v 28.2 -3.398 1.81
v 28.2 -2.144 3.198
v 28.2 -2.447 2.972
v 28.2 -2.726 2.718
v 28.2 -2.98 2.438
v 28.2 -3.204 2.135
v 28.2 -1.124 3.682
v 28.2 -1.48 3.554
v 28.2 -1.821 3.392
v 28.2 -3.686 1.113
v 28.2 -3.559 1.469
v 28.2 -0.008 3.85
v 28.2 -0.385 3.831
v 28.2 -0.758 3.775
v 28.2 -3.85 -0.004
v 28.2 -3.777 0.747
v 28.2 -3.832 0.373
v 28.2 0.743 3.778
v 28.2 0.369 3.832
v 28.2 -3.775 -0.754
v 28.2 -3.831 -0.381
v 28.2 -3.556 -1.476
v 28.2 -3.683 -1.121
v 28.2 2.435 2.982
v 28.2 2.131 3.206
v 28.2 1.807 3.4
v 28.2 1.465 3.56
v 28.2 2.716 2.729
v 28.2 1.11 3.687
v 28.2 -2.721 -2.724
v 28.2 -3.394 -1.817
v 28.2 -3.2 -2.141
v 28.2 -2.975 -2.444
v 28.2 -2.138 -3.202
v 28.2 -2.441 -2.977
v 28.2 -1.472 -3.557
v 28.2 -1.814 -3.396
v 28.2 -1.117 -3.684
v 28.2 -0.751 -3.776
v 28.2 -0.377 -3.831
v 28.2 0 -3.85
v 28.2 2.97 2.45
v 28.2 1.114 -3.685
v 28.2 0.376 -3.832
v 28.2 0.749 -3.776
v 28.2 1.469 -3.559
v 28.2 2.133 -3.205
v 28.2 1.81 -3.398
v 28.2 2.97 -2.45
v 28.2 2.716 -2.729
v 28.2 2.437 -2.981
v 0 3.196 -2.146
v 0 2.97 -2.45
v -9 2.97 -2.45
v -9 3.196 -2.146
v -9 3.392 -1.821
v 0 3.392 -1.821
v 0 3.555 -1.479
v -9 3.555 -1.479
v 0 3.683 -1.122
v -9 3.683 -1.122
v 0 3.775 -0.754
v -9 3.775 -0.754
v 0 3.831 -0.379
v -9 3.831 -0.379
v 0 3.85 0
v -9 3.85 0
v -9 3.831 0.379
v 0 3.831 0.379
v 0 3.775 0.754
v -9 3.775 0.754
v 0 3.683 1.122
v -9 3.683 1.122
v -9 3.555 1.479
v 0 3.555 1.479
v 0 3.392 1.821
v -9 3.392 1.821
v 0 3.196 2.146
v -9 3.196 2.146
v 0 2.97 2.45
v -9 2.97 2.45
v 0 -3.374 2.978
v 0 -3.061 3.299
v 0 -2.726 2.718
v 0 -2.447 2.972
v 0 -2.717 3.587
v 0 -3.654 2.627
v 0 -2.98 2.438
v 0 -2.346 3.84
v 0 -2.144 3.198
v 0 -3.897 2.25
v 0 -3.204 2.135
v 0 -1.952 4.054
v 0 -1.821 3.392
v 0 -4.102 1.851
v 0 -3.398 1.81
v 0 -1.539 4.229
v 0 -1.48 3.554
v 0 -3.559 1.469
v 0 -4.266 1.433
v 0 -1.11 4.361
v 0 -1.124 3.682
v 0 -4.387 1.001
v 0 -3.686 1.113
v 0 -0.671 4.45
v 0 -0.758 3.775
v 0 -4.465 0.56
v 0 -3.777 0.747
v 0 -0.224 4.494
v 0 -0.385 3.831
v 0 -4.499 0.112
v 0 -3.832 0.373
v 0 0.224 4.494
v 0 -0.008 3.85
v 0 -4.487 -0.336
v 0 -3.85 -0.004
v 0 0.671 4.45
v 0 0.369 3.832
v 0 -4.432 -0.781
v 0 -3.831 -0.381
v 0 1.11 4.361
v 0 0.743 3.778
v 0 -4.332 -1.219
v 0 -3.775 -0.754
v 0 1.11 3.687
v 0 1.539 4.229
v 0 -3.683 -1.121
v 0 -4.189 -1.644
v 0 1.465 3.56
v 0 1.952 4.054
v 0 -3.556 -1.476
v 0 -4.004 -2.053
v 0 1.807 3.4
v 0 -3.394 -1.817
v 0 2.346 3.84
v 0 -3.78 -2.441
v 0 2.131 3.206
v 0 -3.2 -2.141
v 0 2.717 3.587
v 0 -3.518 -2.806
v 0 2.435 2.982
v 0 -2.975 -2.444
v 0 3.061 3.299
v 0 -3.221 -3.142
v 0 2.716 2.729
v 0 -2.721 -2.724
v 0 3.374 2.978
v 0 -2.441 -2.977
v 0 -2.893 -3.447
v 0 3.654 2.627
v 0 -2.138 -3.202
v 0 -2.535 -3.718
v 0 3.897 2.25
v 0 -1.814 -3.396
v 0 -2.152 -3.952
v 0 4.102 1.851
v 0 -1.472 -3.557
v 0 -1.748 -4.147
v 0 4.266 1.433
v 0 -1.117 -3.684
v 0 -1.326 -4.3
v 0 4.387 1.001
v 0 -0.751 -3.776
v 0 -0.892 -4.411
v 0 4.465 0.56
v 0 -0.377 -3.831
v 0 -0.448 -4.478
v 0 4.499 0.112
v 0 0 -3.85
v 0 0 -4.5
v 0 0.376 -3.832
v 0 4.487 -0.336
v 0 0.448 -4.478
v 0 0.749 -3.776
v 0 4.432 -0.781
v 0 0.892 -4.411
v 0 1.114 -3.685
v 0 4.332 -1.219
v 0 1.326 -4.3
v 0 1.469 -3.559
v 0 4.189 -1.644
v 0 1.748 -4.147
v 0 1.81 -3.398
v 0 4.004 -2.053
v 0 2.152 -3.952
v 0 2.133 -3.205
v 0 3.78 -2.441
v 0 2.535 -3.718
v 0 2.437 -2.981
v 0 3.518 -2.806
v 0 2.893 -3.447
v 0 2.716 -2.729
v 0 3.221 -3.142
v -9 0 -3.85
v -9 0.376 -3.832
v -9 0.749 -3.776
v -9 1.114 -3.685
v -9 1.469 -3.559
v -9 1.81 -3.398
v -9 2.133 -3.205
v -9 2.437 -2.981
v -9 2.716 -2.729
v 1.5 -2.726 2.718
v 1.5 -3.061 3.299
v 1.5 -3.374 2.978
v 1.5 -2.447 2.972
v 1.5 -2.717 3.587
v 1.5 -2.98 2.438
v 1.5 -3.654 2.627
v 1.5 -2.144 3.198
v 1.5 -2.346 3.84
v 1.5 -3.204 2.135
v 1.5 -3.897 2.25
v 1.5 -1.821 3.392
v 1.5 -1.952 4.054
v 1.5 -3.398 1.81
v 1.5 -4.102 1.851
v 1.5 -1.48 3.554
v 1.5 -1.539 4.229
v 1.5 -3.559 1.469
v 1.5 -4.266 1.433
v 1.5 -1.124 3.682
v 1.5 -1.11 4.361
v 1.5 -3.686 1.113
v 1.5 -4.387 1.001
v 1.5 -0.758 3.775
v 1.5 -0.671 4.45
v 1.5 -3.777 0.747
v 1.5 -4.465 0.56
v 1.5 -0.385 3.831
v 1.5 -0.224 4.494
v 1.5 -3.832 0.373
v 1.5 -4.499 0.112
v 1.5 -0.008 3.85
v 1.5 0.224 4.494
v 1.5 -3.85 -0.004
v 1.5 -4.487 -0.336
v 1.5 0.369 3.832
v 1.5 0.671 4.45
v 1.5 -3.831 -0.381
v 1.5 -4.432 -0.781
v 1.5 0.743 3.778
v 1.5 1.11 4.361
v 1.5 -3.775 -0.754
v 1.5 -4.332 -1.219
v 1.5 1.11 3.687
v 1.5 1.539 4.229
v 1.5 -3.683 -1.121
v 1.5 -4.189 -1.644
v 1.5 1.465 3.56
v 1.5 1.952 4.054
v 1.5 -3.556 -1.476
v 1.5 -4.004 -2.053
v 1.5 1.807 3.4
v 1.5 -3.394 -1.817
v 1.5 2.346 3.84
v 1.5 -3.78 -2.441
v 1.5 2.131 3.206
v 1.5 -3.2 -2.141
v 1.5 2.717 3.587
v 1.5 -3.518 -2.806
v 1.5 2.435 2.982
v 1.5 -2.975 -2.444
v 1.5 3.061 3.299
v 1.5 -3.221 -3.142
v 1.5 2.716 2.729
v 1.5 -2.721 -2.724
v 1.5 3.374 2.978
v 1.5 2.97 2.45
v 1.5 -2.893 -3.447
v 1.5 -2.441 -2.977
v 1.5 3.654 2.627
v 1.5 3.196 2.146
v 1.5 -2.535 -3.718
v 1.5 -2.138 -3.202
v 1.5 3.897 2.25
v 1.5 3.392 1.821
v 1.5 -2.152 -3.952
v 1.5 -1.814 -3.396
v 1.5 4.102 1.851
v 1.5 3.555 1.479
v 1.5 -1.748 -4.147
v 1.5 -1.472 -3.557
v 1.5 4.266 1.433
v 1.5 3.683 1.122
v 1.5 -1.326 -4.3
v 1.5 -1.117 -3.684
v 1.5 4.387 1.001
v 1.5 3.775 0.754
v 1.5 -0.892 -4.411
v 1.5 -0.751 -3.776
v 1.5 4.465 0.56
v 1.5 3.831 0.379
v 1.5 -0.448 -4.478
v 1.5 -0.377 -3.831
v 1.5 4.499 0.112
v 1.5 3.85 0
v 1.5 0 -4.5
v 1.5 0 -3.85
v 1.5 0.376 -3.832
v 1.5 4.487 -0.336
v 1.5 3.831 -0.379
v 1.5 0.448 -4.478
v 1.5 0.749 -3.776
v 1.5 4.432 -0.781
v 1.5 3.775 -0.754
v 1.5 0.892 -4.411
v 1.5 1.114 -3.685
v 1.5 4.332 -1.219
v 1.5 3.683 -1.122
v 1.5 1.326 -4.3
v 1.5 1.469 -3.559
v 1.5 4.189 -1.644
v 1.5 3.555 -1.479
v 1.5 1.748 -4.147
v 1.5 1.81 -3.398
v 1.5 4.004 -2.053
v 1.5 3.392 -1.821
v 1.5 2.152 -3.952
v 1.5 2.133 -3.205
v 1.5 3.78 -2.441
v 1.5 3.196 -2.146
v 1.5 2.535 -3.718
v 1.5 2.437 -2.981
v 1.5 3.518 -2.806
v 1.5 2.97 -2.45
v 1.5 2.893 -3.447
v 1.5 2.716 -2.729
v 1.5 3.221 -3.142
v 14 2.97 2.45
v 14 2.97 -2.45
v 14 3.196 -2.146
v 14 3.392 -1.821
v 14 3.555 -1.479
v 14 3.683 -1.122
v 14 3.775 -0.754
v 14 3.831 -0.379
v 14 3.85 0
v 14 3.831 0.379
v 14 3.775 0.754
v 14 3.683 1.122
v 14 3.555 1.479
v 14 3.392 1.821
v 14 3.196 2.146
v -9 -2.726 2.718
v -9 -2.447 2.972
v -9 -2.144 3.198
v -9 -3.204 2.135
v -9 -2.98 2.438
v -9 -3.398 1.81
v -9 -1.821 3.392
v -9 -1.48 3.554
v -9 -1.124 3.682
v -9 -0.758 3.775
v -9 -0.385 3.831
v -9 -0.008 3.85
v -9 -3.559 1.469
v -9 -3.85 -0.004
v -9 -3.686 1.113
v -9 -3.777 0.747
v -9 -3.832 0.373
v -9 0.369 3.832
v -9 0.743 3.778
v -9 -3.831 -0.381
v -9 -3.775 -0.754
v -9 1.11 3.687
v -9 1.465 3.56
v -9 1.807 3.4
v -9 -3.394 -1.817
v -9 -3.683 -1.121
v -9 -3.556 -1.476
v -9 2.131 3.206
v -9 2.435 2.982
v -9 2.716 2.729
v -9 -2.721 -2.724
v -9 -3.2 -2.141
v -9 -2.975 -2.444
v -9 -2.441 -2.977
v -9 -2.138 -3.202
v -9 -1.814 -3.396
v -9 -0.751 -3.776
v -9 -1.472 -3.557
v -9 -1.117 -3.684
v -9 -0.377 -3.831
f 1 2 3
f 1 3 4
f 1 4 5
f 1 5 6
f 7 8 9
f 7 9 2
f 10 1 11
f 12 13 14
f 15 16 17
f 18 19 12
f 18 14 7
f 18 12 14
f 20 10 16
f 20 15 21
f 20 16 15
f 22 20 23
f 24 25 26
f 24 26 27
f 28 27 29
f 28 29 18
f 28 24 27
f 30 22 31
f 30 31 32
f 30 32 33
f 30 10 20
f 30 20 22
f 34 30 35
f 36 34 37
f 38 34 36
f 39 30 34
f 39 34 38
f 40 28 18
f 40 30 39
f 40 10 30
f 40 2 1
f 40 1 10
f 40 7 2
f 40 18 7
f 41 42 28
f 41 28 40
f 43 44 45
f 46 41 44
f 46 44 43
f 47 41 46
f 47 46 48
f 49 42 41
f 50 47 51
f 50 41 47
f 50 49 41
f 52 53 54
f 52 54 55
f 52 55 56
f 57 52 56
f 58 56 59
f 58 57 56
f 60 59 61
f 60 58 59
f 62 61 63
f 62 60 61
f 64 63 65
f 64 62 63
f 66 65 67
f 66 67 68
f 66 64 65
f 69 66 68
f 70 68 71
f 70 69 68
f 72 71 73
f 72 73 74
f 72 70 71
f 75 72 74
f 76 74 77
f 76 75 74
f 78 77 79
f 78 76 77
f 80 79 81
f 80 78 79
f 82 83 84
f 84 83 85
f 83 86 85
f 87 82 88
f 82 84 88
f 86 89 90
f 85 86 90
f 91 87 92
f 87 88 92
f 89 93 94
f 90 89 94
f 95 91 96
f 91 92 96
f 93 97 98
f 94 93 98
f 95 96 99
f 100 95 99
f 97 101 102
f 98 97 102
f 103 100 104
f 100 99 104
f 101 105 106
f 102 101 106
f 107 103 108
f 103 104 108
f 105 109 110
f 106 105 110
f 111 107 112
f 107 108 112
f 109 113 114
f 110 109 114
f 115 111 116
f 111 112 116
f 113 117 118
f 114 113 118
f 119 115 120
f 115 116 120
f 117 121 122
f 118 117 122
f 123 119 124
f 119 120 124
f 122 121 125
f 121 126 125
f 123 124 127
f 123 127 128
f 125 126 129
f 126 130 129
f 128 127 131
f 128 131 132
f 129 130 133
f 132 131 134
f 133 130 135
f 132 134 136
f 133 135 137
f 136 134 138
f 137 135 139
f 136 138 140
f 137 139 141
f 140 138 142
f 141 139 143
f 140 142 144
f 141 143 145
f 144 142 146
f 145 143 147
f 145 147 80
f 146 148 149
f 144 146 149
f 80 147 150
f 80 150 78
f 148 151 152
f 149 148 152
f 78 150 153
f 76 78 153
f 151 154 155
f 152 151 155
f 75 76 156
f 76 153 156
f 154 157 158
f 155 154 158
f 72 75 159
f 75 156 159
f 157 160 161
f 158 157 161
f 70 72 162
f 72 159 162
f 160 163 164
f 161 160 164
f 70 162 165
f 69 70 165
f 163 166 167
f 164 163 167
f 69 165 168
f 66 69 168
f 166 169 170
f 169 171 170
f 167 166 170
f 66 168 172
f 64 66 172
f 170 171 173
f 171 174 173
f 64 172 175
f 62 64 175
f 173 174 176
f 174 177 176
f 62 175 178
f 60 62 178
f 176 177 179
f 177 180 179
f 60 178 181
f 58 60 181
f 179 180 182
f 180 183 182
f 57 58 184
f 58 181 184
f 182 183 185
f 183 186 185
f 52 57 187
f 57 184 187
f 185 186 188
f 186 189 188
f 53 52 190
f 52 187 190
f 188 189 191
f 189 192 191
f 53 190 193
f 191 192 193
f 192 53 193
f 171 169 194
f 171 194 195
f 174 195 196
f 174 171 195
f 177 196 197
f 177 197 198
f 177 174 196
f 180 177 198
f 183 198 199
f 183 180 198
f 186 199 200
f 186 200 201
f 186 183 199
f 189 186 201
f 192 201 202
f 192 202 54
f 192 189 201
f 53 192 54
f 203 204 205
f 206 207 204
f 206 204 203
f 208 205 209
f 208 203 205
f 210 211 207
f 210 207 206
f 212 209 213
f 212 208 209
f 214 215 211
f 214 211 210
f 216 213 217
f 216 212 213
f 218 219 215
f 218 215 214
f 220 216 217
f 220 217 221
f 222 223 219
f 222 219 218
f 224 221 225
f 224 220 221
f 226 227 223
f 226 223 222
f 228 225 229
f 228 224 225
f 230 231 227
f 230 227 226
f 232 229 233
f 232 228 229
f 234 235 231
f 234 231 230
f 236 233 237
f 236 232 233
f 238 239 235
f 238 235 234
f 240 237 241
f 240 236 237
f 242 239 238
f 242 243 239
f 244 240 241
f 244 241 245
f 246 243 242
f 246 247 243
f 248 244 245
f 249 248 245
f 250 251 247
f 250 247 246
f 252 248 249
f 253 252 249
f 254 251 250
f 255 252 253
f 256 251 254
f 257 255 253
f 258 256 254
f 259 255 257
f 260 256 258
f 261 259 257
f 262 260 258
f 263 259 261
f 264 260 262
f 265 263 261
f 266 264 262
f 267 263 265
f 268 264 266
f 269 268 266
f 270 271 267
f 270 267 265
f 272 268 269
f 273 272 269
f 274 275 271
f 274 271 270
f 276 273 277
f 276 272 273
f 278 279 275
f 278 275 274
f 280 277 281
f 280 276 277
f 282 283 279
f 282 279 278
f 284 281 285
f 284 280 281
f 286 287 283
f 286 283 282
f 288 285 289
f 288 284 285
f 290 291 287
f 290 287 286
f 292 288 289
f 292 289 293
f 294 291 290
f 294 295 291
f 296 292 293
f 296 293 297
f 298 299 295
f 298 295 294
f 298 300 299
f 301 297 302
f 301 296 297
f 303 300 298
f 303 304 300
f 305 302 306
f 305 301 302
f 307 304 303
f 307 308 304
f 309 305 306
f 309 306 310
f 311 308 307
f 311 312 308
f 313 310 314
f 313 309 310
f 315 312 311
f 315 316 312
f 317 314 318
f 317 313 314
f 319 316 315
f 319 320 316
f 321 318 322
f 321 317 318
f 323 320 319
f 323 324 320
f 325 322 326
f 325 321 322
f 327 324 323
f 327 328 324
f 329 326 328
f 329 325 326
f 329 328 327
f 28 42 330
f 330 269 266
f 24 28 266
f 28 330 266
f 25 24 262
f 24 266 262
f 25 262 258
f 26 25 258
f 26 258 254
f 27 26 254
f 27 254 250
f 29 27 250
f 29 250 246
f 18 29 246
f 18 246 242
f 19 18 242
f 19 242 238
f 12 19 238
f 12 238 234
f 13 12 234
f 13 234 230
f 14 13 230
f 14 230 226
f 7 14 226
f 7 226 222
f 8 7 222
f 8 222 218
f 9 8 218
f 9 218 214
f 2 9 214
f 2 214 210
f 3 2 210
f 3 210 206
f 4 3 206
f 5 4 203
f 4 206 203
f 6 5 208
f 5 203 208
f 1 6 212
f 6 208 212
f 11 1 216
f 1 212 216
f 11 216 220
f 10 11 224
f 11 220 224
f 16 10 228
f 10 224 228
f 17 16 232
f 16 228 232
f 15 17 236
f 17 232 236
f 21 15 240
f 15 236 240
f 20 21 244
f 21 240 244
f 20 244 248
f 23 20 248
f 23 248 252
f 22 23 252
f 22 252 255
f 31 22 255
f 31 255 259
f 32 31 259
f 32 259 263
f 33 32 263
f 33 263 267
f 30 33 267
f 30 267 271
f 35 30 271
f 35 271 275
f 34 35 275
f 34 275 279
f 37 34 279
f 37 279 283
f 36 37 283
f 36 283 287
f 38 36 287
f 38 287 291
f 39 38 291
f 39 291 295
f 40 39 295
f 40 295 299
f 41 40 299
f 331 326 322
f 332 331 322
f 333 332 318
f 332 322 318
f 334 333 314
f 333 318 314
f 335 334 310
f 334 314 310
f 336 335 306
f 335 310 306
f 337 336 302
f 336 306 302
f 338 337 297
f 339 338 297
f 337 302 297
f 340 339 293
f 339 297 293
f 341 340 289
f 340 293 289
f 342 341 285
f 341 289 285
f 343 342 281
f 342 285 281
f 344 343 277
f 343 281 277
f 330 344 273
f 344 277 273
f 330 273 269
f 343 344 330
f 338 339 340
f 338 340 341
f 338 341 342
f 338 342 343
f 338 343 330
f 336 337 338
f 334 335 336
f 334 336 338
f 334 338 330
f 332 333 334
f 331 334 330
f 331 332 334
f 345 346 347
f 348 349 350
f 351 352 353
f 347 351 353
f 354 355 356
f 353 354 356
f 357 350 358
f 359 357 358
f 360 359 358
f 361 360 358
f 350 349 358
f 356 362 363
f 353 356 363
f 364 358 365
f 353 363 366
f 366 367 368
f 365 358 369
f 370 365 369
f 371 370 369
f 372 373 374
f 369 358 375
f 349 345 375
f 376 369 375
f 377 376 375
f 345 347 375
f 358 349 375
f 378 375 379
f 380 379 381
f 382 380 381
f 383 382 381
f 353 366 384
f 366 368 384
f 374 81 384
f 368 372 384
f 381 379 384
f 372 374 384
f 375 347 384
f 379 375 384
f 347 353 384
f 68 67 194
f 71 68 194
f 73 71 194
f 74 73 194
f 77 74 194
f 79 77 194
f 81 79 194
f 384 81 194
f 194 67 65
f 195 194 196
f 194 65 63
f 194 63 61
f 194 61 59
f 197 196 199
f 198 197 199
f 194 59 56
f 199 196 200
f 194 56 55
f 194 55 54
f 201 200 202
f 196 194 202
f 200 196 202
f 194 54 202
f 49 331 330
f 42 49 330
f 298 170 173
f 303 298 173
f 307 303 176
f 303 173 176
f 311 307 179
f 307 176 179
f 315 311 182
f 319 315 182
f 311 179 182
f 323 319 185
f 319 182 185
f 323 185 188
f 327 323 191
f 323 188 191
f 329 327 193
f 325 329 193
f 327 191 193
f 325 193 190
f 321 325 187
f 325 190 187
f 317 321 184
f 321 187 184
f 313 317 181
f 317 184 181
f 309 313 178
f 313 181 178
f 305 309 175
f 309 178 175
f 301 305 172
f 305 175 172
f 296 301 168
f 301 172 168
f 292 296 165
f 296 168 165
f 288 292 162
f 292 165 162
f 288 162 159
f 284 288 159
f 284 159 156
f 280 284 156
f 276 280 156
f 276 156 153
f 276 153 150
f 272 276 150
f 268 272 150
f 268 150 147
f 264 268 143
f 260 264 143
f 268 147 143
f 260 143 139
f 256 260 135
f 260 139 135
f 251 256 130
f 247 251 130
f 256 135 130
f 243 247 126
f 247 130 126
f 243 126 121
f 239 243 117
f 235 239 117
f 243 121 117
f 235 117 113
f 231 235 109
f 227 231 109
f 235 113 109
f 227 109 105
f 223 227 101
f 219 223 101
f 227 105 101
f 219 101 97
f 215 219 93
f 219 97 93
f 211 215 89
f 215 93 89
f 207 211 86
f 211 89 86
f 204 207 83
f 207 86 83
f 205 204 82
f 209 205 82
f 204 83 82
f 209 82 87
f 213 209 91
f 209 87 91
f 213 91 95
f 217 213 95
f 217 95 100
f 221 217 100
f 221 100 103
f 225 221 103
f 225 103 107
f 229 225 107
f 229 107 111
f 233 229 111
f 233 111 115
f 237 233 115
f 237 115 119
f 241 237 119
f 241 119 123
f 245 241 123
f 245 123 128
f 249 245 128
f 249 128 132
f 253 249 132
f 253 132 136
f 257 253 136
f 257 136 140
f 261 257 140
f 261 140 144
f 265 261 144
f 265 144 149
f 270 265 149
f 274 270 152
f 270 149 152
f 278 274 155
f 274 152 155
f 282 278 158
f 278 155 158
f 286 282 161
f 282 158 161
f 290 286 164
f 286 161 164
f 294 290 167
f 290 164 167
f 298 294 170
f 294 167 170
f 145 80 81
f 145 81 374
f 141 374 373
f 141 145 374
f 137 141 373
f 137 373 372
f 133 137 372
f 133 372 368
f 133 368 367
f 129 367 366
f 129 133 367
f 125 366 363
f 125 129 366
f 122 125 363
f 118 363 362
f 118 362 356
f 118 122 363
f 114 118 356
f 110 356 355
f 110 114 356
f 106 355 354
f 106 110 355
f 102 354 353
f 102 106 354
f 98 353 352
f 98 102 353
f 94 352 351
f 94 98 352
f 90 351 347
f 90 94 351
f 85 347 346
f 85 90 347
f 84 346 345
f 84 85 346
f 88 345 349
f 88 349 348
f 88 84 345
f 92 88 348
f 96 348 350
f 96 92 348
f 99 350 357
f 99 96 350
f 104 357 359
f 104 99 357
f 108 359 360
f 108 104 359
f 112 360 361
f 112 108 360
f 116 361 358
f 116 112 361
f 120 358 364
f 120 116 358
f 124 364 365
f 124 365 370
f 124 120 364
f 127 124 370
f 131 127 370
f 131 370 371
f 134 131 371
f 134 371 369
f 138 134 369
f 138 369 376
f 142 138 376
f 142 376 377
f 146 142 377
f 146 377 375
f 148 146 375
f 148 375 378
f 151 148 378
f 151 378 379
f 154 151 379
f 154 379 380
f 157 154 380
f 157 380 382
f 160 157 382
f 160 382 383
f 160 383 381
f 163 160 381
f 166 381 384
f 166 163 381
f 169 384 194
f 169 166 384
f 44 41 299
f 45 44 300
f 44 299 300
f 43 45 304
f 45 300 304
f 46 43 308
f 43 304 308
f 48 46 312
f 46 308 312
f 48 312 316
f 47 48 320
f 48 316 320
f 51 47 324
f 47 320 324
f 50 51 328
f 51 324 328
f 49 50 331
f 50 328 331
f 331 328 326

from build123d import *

# Parameters (mm, degrees)
BOSS_EXTRUDE1_DEPTH = 28.2
SKETCH9_6_R         = 4.5
SKETCH9_6_R_2       = 3.85
BOSS_EXTRUDE2_DEPTH = 1.5
BOSS_EXTRUDE3_DEPTH = 14
BOSS_EXTRUDE4_DEPTH = 9


with BuildPart() as part:
    # Sketch9 → Boss-Extrude1 (new body)
    with BuildSketch(Plane(origin=(0, 0, 0), x_dir=(0, 0, -1), z_dir=(1, 0, 0))):
        with BuildLine():
            Line((2.45, 2.969848481), (-2.45, 2.969848481))
            ThreePointArc((-2.45, 2.969848481), (-1.641645516, -3.48245603), (3.85, 0))
            ThreePointArc((3.85, 0), (3.48245603, 1.641645516), (2.45, 2.969848481))
        make_face()
    extrude(amount=BOSS_EXTRUDE1_DEPTH)

    # Sketch9<6> → Boss-Extrude2 (add)
    with BuildSketch(Plane(origin=(0, 0, 0), x_dir=(0, 0, -1), z_dir=(1, 0, 0))):
        Circle(SKETCH9_6_R)
        Circle(SKETCH9_6_R_2, mode=Mode.SUBTRACT)
    extrude(amount=BOSS_EXTRUDE2_DEPTH)

    # Sketch9<7> → Boss-Extrude3 (add)
    with BuildSketch(Plane(origin=(0, 0, 0), x_dir=(0, 0, -1), z_dir=(1, 0, 0))):
        with BuildLine():
            ThreePointArc((2.45, 2.969848481), (0, 3.85), (-2.45, 2.969848481))
            Line((-2.45, 2.969848481), (2.45, 2.969848481))
        make_face()
        with BuildLine():
            Line((2.45, 2.969848481), (-2.45, 2.969848481))
            ThreePointArc((-2.45, 2.969848481), (-1.641645516, -3.48245603), (3.85, 0))
            ThreePointArc((3.85, 0), (3.48245603, 1.641645516), (2.45, 2.969848481))
        make_face()
    extrude(amount=BOSS_EXTRUDE3_DEPTH)

    # Sketch9<8> → Boss-Extrude4 (add)
    with BuildSketch(Plane(origin=(0, 0, 0), x_dir=(0, 0, -1), z_dir=(1, 0, 0))):
        with BuildLine():
            ThreePointArc((2.45, 2.969848481), (0, 3.85), (-2.45, 2.969848481))
            Line((-2.45, 2.969848481), (2.45, 2.969848481))
        make_face()
        with BuildLine():
            Line((2.45, 2.969848481), (-2.45, 2.969848481))
            ThreePointArc((-2.45, 2.969848481), (-1.641645516, -3.48245603), (3.85, 0))
            ThreePointArc((3.85, 0), (3.48245603, 1.641645516), (2.45, 2.969848481))
        make_face()
    extrude(amount=-BOSS_EXTRUDE4_DEPTH)


solid = part.part
